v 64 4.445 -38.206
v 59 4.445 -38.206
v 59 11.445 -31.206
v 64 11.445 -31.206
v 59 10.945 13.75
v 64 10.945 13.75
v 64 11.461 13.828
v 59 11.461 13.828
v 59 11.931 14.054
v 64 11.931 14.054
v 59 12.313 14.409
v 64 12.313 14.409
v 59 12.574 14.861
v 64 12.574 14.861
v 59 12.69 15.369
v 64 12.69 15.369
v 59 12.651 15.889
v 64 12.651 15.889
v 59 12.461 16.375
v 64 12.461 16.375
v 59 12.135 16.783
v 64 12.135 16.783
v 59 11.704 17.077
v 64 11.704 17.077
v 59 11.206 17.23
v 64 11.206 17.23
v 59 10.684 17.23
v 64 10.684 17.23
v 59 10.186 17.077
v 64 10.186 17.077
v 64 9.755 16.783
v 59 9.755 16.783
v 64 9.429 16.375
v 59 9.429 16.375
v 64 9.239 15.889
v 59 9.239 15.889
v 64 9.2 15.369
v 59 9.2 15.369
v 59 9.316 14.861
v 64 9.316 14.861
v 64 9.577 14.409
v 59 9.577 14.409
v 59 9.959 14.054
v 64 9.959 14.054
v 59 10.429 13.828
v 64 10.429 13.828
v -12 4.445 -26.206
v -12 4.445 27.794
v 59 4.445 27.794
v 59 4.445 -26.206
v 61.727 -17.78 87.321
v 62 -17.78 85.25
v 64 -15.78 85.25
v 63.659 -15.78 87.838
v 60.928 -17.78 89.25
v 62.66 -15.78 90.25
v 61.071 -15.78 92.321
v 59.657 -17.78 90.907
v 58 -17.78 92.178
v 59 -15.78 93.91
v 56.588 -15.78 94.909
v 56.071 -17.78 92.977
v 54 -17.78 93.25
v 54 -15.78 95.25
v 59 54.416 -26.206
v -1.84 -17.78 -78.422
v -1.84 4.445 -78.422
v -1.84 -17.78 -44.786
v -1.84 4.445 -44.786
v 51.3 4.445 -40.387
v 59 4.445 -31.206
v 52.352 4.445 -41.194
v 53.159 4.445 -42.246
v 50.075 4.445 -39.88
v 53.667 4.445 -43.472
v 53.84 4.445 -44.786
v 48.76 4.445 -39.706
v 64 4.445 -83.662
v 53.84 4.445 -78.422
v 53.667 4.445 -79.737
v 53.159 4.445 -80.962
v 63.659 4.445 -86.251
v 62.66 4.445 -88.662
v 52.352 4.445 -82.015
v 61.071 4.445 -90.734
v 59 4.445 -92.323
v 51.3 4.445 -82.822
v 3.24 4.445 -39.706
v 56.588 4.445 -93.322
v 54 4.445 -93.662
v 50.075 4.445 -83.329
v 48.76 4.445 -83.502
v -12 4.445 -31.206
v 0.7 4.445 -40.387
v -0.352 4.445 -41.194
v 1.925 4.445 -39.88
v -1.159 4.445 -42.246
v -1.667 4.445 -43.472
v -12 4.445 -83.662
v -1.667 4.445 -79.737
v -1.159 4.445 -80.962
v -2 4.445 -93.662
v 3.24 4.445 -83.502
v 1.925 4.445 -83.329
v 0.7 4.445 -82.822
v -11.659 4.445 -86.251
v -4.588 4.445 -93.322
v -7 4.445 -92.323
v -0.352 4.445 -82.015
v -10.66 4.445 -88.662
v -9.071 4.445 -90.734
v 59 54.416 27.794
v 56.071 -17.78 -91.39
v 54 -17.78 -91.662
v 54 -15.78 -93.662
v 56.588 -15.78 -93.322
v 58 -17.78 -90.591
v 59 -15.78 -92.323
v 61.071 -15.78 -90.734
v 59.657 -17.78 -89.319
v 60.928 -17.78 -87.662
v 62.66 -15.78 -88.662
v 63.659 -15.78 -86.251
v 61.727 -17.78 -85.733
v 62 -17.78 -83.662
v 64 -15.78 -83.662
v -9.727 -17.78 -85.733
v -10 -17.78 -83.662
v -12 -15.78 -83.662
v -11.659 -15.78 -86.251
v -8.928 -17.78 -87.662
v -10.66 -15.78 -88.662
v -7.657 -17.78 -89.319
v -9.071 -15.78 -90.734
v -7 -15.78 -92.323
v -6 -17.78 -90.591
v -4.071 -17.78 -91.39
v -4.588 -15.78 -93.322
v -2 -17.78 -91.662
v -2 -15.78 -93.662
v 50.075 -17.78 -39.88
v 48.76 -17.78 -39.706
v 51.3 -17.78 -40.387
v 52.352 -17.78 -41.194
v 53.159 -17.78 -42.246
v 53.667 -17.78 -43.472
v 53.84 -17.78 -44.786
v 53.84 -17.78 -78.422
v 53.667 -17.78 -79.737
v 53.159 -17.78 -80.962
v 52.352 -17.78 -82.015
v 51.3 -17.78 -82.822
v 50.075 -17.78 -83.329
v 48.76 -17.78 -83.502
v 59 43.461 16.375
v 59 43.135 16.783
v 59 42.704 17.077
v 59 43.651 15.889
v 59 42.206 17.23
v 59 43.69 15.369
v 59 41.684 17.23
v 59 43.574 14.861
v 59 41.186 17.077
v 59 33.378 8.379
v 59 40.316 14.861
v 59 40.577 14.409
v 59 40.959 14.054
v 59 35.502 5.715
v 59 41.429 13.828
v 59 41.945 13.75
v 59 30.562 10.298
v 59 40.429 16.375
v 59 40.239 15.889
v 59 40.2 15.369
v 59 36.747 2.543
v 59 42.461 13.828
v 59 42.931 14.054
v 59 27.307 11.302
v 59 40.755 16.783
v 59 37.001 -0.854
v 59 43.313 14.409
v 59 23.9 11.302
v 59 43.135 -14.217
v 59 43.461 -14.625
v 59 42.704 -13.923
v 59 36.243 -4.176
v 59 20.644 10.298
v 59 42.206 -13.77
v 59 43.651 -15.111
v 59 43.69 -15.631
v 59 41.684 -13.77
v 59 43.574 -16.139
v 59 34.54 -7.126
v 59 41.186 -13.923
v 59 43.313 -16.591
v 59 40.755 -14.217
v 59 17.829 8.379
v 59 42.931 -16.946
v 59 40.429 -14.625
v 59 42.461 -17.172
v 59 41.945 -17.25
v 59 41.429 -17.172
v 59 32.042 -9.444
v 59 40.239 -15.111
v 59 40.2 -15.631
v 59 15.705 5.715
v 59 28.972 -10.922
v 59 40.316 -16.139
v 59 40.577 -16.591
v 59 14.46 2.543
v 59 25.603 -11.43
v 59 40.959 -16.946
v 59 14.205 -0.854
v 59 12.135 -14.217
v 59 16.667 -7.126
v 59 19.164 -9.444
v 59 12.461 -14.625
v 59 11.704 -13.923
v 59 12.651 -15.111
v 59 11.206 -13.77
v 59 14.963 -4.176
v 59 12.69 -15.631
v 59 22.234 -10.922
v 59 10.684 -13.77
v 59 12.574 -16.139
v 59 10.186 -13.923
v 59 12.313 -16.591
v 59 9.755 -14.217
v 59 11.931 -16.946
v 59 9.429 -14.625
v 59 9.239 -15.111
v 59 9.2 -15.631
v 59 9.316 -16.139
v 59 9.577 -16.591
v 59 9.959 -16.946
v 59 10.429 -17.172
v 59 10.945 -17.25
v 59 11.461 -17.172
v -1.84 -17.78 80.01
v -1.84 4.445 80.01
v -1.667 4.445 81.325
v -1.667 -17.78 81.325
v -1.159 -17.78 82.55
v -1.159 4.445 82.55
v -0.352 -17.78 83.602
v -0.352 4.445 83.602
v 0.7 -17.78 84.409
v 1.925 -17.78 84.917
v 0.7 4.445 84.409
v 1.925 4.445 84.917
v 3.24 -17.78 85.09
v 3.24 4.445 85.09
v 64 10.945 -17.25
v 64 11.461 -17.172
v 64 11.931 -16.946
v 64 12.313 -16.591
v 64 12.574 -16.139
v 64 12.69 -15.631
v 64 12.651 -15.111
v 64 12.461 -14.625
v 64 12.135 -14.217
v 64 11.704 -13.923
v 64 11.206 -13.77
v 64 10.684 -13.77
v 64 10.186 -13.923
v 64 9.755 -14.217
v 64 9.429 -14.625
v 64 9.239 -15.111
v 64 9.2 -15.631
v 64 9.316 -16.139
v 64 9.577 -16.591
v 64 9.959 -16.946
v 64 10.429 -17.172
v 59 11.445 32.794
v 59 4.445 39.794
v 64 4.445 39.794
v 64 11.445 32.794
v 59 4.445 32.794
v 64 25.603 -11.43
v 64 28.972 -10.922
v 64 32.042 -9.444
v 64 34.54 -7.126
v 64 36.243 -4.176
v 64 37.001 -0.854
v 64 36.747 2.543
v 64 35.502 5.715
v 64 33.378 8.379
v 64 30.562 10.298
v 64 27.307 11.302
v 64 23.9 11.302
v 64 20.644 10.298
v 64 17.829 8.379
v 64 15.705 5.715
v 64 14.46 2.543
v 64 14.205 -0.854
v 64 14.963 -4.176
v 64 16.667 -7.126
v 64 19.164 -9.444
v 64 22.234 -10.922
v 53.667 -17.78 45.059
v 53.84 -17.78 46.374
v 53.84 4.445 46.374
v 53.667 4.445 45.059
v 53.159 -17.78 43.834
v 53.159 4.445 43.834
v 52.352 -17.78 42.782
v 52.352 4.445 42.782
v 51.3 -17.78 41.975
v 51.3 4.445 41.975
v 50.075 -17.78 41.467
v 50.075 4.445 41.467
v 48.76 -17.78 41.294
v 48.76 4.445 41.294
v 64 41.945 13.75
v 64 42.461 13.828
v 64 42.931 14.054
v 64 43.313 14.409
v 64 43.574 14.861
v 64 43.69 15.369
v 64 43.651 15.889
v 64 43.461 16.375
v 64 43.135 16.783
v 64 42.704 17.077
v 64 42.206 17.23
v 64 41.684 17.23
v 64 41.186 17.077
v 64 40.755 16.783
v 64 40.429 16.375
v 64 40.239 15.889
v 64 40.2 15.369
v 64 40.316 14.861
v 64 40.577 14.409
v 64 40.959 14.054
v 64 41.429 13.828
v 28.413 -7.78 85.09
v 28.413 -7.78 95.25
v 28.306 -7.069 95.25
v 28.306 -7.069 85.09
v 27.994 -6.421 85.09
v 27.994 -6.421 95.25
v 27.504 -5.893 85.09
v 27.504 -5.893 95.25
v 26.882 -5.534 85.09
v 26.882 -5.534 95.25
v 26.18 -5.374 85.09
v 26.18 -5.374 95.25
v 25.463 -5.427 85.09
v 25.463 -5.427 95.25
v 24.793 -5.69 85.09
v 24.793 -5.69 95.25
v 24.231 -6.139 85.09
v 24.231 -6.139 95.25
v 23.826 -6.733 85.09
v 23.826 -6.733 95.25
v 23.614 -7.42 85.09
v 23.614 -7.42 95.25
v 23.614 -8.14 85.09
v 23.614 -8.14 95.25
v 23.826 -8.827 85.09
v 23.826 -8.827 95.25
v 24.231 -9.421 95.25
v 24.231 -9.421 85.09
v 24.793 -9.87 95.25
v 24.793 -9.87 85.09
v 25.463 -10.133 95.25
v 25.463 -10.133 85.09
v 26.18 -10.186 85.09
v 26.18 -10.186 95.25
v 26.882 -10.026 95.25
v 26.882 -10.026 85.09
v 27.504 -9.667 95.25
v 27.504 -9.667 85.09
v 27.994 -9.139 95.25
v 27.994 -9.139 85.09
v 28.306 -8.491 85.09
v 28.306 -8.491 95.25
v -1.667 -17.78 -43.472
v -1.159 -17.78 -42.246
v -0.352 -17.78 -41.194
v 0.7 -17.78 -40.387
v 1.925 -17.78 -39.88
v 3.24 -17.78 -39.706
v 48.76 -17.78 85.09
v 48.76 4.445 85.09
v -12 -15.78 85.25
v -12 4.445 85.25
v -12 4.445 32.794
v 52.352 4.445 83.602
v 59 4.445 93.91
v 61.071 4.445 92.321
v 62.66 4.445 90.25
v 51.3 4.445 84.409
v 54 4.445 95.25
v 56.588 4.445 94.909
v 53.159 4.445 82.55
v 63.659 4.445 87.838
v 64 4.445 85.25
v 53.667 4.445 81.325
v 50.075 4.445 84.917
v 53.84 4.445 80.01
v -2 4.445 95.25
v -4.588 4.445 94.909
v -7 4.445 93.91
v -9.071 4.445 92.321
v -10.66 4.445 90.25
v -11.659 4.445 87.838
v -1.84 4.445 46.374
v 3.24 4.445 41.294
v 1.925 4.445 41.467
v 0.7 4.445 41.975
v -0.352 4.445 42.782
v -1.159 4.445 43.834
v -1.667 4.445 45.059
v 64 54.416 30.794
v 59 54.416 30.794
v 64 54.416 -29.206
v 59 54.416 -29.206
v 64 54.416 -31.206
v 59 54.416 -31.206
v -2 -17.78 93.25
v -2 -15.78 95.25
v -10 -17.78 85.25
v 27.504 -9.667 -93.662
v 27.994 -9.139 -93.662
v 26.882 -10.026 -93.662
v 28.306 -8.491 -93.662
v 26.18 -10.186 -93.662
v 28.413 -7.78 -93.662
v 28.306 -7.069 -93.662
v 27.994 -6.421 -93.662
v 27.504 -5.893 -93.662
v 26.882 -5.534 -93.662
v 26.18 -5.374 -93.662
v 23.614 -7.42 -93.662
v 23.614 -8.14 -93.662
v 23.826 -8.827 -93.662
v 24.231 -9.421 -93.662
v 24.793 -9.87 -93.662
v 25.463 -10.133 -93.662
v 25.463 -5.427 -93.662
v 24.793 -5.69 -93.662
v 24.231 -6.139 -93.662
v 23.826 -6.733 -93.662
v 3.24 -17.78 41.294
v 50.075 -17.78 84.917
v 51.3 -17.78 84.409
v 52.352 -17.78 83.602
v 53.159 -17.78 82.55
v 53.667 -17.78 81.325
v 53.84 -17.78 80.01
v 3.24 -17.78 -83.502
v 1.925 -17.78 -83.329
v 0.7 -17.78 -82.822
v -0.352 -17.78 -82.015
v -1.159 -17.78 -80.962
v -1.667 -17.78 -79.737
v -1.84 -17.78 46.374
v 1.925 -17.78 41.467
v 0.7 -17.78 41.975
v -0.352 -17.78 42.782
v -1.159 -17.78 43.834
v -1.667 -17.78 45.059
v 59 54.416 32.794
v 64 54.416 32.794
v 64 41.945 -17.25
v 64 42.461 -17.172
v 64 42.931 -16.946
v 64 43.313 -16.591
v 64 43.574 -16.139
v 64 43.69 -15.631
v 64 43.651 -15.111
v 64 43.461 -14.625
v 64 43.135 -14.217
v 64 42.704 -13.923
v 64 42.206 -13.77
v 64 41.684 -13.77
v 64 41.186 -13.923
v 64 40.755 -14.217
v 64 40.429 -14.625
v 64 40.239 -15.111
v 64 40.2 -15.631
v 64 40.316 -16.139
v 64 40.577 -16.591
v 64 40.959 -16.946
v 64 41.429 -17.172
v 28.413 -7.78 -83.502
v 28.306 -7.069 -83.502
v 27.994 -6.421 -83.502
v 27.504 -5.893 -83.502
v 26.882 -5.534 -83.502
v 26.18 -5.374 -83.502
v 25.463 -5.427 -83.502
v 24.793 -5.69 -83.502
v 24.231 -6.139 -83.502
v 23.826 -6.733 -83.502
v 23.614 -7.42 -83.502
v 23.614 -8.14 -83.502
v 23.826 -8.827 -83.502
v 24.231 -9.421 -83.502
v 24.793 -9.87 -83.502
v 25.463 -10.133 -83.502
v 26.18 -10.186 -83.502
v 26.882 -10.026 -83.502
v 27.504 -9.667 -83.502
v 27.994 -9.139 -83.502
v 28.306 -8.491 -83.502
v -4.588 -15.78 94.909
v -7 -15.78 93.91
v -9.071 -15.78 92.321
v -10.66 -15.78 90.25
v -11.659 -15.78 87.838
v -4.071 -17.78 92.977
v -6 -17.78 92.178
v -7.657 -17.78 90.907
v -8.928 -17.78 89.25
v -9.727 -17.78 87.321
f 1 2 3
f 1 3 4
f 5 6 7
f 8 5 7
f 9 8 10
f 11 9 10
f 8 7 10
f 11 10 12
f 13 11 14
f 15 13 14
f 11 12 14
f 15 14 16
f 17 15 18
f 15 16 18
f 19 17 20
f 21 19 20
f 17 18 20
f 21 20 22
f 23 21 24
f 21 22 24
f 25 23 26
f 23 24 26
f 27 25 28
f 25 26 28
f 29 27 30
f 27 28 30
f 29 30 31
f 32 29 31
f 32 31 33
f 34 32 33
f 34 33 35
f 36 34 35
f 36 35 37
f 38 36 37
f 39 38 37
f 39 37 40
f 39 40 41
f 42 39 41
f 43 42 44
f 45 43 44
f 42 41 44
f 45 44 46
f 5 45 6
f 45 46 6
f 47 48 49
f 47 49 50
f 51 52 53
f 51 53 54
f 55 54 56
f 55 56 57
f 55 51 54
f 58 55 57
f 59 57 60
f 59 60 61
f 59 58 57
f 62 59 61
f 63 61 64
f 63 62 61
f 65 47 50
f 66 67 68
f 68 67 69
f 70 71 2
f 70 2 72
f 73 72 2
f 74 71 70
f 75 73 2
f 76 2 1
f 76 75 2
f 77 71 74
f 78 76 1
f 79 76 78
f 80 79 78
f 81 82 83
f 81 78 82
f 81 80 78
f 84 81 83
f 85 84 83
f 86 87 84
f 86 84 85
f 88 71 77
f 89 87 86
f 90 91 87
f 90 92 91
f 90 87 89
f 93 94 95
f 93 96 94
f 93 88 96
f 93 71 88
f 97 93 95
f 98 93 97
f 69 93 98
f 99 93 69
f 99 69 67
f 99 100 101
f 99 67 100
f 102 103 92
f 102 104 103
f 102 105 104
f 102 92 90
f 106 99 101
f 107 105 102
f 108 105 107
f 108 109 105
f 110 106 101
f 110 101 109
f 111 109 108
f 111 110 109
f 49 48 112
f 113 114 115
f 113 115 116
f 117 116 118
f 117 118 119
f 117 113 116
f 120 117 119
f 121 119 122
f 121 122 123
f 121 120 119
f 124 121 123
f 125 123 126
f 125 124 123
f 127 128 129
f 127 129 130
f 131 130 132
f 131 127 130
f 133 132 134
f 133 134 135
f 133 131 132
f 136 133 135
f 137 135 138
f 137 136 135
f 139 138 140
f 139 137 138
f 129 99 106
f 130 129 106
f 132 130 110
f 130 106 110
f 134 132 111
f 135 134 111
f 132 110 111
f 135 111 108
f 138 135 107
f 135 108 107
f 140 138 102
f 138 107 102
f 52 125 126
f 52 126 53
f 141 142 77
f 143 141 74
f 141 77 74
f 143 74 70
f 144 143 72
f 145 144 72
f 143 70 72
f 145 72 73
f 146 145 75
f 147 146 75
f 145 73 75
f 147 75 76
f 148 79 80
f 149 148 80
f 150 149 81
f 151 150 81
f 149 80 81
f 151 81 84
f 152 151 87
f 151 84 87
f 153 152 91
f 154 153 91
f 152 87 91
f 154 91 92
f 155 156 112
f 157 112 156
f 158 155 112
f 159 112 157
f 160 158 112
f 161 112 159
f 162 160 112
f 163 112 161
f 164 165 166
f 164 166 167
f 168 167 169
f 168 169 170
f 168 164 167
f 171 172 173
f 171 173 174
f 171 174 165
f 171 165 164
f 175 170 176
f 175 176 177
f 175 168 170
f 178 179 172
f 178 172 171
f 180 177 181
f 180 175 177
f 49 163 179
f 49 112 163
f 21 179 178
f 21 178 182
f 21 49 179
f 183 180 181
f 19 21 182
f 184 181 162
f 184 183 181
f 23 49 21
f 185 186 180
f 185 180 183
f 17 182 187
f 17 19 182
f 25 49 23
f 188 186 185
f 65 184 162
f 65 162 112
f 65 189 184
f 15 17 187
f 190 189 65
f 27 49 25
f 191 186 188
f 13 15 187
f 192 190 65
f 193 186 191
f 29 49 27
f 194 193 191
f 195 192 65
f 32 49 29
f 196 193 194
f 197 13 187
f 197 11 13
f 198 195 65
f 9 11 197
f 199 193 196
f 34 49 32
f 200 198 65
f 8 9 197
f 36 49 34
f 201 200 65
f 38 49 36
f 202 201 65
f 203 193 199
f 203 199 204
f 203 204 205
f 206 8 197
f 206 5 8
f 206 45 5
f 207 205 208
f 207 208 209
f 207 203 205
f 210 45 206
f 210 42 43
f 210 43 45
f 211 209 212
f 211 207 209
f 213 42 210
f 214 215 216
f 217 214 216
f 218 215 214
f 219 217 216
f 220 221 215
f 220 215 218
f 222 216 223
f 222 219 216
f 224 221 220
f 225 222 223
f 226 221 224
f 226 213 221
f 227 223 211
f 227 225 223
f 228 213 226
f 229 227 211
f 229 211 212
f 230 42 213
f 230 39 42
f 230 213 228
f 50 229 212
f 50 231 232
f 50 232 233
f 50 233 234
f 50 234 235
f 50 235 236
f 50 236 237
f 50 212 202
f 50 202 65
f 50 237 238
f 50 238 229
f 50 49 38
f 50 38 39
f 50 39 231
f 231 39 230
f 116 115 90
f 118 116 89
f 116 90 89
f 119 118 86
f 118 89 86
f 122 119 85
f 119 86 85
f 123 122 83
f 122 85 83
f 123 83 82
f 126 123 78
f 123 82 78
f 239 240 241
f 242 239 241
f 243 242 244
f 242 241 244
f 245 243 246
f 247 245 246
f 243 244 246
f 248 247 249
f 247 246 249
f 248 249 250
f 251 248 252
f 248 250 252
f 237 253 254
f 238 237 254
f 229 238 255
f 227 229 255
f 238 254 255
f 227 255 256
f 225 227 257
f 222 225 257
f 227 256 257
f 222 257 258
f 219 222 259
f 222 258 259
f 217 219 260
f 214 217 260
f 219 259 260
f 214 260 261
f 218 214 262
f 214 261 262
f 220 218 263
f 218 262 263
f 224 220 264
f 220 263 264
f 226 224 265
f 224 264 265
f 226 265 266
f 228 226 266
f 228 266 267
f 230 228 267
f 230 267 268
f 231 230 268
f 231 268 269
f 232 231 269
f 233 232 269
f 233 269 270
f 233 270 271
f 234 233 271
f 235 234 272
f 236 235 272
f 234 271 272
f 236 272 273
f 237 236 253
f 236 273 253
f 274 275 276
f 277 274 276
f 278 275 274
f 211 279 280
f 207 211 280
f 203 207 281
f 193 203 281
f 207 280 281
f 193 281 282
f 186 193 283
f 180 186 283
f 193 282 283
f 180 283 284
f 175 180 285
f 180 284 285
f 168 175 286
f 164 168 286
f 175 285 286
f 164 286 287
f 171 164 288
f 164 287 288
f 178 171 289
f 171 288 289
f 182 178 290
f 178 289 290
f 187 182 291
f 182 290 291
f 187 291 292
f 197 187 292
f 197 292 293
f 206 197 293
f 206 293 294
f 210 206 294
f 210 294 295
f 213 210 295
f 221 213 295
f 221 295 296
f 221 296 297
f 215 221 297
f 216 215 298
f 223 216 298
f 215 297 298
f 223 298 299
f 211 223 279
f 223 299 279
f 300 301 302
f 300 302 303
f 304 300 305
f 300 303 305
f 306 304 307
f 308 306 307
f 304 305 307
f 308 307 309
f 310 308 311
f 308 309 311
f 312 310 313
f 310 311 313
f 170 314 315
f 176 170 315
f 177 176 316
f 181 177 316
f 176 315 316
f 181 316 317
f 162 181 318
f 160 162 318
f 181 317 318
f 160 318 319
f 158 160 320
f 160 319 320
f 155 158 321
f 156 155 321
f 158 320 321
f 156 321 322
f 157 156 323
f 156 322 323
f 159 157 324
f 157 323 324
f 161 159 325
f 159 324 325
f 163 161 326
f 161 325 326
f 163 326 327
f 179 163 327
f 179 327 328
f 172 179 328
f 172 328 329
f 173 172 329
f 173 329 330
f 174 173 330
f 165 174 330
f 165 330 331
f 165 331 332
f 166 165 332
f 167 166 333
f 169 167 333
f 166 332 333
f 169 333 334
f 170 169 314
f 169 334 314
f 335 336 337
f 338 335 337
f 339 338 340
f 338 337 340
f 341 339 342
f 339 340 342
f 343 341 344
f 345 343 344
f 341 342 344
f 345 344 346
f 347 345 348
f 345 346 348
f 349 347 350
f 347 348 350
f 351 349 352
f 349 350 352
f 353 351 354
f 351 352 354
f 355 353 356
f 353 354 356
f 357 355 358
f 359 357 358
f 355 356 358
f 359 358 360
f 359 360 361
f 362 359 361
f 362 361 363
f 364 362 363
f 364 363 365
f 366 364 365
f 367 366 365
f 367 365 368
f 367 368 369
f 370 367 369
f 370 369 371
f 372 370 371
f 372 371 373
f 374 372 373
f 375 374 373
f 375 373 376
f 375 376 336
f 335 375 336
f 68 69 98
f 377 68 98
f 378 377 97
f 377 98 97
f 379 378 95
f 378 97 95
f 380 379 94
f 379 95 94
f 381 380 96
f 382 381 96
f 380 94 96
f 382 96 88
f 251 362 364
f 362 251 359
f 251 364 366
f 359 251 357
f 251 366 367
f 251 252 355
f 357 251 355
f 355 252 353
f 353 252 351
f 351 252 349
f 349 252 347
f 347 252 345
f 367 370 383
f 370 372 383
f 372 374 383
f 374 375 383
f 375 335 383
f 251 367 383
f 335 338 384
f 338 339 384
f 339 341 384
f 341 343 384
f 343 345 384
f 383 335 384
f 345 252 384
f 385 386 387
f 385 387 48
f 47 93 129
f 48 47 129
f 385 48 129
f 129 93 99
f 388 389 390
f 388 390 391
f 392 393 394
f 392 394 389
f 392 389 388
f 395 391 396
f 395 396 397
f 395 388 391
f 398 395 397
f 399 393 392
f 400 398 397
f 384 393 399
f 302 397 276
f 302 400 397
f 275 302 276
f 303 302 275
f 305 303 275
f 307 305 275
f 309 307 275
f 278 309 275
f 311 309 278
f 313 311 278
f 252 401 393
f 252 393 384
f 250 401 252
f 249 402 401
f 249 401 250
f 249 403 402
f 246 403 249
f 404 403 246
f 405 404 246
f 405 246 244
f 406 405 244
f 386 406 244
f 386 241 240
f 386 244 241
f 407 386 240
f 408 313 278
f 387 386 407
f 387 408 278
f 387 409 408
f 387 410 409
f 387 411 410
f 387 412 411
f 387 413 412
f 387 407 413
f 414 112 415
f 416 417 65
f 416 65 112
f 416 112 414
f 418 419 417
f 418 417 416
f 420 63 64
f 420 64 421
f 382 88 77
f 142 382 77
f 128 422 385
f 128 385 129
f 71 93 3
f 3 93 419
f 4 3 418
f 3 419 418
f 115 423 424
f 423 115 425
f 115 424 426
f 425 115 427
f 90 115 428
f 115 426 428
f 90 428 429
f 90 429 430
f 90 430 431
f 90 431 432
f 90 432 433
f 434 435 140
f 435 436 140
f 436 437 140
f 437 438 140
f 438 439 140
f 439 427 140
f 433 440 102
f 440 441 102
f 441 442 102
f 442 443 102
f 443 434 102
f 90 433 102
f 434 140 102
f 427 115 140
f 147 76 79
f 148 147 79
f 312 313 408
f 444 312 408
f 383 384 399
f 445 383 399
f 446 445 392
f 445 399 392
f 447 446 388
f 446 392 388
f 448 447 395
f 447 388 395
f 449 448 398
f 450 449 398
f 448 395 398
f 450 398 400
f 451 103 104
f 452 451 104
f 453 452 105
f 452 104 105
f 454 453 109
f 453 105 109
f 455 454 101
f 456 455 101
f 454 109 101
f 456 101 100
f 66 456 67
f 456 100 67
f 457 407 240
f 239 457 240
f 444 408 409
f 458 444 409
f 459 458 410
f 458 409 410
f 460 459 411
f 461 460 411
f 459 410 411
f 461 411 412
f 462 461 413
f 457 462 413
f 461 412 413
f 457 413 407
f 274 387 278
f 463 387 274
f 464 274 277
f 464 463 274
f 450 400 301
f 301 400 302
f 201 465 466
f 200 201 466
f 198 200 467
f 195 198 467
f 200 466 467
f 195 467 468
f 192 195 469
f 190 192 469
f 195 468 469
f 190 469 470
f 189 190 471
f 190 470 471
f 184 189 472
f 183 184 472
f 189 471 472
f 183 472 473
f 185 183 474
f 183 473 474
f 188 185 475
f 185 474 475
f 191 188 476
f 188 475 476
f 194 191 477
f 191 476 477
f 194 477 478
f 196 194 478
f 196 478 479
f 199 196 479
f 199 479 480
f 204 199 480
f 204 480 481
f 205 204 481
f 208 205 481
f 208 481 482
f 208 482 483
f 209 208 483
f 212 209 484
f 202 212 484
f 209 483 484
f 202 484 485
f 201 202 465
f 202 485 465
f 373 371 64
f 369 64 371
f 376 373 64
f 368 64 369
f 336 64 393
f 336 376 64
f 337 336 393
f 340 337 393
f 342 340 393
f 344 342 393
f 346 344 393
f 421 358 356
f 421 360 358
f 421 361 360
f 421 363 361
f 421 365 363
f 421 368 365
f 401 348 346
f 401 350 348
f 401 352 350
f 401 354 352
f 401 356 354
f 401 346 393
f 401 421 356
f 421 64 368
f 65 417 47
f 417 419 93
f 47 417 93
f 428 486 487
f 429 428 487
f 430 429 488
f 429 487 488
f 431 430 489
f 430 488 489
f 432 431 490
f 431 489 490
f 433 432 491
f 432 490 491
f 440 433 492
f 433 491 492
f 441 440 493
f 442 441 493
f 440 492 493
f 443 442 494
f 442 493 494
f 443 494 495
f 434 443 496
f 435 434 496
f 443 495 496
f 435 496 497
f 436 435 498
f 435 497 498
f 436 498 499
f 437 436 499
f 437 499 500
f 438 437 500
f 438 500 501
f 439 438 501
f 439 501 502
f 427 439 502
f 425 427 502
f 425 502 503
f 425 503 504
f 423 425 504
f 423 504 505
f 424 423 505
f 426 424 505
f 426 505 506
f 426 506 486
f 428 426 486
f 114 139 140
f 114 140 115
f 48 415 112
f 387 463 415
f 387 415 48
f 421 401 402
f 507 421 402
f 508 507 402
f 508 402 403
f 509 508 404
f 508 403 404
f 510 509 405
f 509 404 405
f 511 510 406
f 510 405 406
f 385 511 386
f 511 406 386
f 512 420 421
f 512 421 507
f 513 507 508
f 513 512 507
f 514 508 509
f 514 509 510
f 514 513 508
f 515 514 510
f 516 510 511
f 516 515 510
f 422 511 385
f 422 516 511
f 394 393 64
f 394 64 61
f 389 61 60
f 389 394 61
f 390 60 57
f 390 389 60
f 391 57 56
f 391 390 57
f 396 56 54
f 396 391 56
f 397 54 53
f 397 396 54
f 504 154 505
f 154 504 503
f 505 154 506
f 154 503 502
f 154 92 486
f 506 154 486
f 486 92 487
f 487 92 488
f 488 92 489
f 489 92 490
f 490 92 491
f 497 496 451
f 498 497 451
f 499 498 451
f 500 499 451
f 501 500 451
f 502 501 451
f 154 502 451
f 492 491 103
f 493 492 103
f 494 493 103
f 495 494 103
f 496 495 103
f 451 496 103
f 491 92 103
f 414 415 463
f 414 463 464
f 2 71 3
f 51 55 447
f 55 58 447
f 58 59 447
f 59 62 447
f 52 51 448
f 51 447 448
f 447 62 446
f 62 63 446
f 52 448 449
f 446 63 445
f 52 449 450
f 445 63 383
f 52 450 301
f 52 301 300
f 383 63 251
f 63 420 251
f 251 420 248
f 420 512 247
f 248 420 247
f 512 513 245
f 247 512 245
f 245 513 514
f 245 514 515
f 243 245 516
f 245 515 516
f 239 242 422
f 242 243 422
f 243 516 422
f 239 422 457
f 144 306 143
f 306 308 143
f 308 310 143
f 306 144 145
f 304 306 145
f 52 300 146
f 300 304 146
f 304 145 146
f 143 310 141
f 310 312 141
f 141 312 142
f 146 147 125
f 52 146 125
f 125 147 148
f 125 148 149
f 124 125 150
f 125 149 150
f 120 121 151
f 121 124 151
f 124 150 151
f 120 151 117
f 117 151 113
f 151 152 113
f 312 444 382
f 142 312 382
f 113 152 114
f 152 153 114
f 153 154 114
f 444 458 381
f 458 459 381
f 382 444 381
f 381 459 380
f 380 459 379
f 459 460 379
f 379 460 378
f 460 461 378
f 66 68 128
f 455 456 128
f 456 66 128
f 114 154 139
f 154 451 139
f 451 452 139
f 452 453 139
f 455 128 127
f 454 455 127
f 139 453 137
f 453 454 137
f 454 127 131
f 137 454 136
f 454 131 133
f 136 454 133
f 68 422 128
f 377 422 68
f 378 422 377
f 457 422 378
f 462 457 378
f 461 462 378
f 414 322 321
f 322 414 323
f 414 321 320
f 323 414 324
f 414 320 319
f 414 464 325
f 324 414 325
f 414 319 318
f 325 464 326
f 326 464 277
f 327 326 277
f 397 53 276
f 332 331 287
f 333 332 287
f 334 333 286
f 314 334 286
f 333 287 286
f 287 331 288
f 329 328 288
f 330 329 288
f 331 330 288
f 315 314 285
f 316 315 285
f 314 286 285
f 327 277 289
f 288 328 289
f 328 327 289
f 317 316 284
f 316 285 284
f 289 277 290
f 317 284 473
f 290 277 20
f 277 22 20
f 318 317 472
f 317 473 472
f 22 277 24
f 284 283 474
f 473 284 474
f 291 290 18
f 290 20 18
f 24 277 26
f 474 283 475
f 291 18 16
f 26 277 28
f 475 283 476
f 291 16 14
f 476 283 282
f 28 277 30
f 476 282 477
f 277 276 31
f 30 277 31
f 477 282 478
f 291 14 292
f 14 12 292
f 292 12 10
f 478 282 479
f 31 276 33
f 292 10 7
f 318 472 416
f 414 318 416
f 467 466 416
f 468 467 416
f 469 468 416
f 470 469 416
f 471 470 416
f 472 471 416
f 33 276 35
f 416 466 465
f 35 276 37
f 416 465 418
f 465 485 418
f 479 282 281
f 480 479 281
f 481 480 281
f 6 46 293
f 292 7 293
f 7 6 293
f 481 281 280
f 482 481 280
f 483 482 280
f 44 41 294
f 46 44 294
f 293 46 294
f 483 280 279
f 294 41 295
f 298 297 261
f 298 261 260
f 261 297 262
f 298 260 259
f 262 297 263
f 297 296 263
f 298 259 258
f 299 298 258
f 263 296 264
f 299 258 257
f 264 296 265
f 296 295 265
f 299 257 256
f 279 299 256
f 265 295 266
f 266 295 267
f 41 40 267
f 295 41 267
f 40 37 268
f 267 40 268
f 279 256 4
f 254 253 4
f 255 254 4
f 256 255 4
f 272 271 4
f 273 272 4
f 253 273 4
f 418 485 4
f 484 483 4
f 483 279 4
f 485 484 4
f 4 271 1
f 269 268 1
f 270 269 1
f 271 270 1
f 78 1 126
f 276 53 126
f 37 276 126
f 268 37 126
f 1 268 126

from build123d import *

# Parameters (mm, degrees)
BOSS_EXTRUDE1_DEPTH      = 64
BOSS_EXTRUDE1_DEPTH_BACK = 12
SKETCH1_W                = 188.9125
SKETCH1_H                = 22.225
SKETCH3_W                = 60
SKETCH3_H                = 50
BOSS_EXTRUDE2_DEPTH      = 5
SKETCH4_R                = 11.43
SKETCH4_R_2              = 1.7499965
SKETCH4_R_3              = 1.75
CUT_EXTRUDE1_DEPTH       = 5
FILLET2_R                = 10
FILLET3_R                = 10
FILLET6_R                = 10
FILLET8_R                = 10
SKETCH18_W               = 5
SKETCH18_H               = 2
BOSS_EXTRUDE4_DEPTH      = 49.97124
SKETCH19_W               = 5
SKETCH19_H               = 2
BOSS_EXTRUDE5_DEPTH      = 49.971244
SKETCH26_R               = 2.413
CUT_EXTRUDE3_DEPTH       = 31.496
CHAMFER1_SIZE            = 7
CHAMFER2_SIZE            = 2
BOSS_EXTRUDE6_DEPTH      = 5
BOSS_EXTRUDE7_DEPTH      = 5
CUT_EXTRUDE2_DEPTH       = 126.162645094
CUT_EXTRUDE4_START       = 16.51
SKETCH27_R               = 2.413
CUT_EXTRUDE4_DEPTH       = 16.51


with BuildPart() as part:
    # Sketch1 → Boss-Extrude1 (new, two sides: drawn at the far end of the back side and taken through both)
    with BuildSketch(Plane(origin=(0, 0, 0), x_dir=(0, 0, -1), z_dir=(1, 0, 0)).offset(-BOSS_EXTRUDE1_DEPTH_BACK)):
        with Locations((-0.79375, -6.6675)):
            Rectangle(SKETCH1_W, SKETCH1_H)
    extrude(amount=BOSS_EXTRUDE1_DEPTH + BOSS_EXTRUDE1_DEPTH_BACK)

    # Sketch3 → Boss-Extrude2 (add)
    with BuildSketch(Plane(origin=(64, 8.866131276, 9.663552159), x_dir=(0, 0, -1), z_dir=(1, 0, 0))):
        with Locations((8.869802159, 20.550112642)):
            Rectangle(SKETCH3_W, SKETCH3_H)
    extrude(amount=-BOSS_EXTRUDE2_DEPTH)

    # Sketch4 → Cut-Extrude1 (cut)
    with BuildSketch(Plane(origin=(64, 0, 0), x_dir=(0, 0, -1), z_dir=(1, 0, 0))):
        with Locations((0, 25.6032)):
            Circle(SKETCH4_R)
        with Locations((-15.5, 41.945)):
            Circle(SKETCH4_R_2)
        with Locations((15.5, 41.945)):
            Circle(SKETCH4_R_2)
        with Locations((-15.5, 10.945)):
            Circle(SKETCH4_R_3)
        with Locations((15.5, 10.945)):
            Circle(SKETCH4_R_3)
    extrude(amount=-CUT_EXTRUDE1_DEPTH, mode=Mode.SUBTRACT)

    # Fillet2
    fillet2_edges = [part.edges().sort_by_distance(p)[0] for p in [
        (-12, -6.6675, 95.25),
    ]]
    fillet(fillet2_edges, radius=FILLET2_R)

    # Fillet3
    fillet3_edges = [part.edges().sort_by_distance(p)[0] for p in [
        (64, -6.6675, 95.25),
    ]]
    fillet(fillet3_edges, radius=FILLET3_R)

    # Fillet6
    fillet6_edges = [part.edges().sort_by_distance(p)[0] for p in [
        (-12, -6.6675, -93.6625),
    ]]
    fillet(fillet6_edges, radius=FILLET6_R)

    # Fillet8
    fillet8_edges = [part.edges().sort_by_distance(p)[0] for p in [
        (64, -6.6675, -93.6625),
    ]]
    fillet(fillet8_edges, radius=FILLET8_R)

    # Sketch18 → Boss-Extrude4 (add)
    with BuildSketch(Plane(origin=(0, 4.445, 0), x_dir=(1, 0, 0), z_dir=(0, 1, 0))):
        with Locations((61.5, -31.79375)):
            Rectangle(SKETCH18_W, SKETCH18_H)
    extrude(amount=BOSS_EXTRUDE4_DEPTH)

    # Sketch19 → Boss-Extrude5 (add)
    with BuildSketch(Plane(origin=(0, 4.445, 0), x_dir=(1, 0, 0), z_dir=(0, 1, 0))):
        with Locations((61.5, 30.20625)):
            Rectangle(SKETCH19_W, SKETCH19_H)
    extrude(amount=BOSS_EXTRUDE5_DEPTH)

    # Sketch26 → Cut-Extrude3 (cut)
    with BuildSketch(Plane.XY.offset(95.25)):
        with Locations((26, -7.78)):
            Circle(SKETCH26_R)
    extrude(amount=-CUT_EXTRUDE3_DEPTH, mode=Mode.SUBTRACT)

    # Chamfer1
    chamfer1_edges = [part.edges().sort_by_distance(p)[0] for p in [
        (61.5, 4.445, -31.20625),
        (61.5, 4.445, 32.79375),
    ]]
    chamfer(chamfer1_edges, length=CHAMFER1_SIZE)

    # Chamfer2
    chamfer2_edges = [part.edges().sort_by_distance(p)[0] for p in [
        (-12, -17.78, 0.79375),
        (26, -17.78, 95.25),
        (-9.071067812, -17.78, 92.321067812),
        (64, -17.78, 0.79375),
        (61.071067812, -17.78, 92.321067812),
        (26, -17.78, -93.6625),
        (-9.071067812, -17.78, -90.733567812),
        (61.071067812, -17.78, -90.733567812),
    ]]
    chamfer(chamfer2_edges, length=CHAMFER2_SIZE)

    # Sketch20 → Boss-Extrude6 (add)
    with BuildSketch(Plane(origin=(0, 0, -31.20625), x_dir=(-1, 0, 0), z_dir=(0, 0, -1))):
        Polygon((-59, 54.416243918), (12, 4.445), (-59, 4.445), align=None)
    extrude(amount=-BOSS_EXTRUDE6_DEPTH)

    # Sketch21 → Boss-Extrude7 (add)
    with BuildSketch(Plane.XY.offset(32.79375)):
        Polygon((59, 54.416243918), (-12, 4.445), (59, 4.445), align=None)
    extrude(amount=-BOSS_EXTRUDE7_DEPTH)

    # Sketch23 → Cut-Extrude2 (cut, through all)
    with BuildSketch(Plane(origin=(0, 4.445, 0), x_dir=(1, 0, 0), z_dir=(0, 1, 0))):
        with BuildLine():
            Line((48.76, -41.29394195), (3.24, -41.29394195))
            ThreePointArc((3.24, -41.29394195), (-0.352102448, -42.781839501), (-1.84, -46.37394195))
            Line((-1.84, -46.37394195), (-1.84, -80.01))
            ThreePointArc((-1.84, -80.01), (-0.352102448, -83.602102448), (3.24, -85.09))
            Line((3.24, -85.09), (48.76, -85.09))
            ThreePointArc((48.76, -85.09), (52.352102448, -83.602102448), (53.84, -80.01))
            Line((53.84, -80.01), (53.84, -46.37394195))
            ThreePointArc((53.84, -46.37394195), (52.352102448, -42.781839501), (48.76, -41.29394195))
        make_face()
        with BuildLine():
            Line((48.76, 83.5025), (3.24, 83.5025))
            ThreePointArc((3.24, 83.5025), (-0.352102448, 82.014602448), (-1.84, 78.4225))
            Line((-1.84, 78.4225), (-1.84, 44.78644195))
            ThreePointArc((-1.84, 44.78644195), (-0.352102448, 41.194339501), (3.24, 39.70644195))
            Line((3.24, 39.70644195), (48.76, 39.70644195))
            ThreePointArc((48.76, 39.70644195), (52.352102448, 41.194339501), (53.84, 44.78644195))
            Line((53.84, 44.78644195), (53.84, 78.4225))
            ThreePointArc((53.84, 78.4225), (52.352102448, 82.014602448), (48.76, 83.5025))
        make_face()
    extrude(amount=-CUT_EXTRUDE2_DEPTH, mode=Mode.SUBTRACT)

    # Sketch27 → Cut-Extrude4 (cut)
    with BuildSketch(Plane.XY.offset(-93.6625).offset(CUT_EXTRUDE4_START)):
        with Locations((26, -7.78)):
            Circle(SKETCH27_R)
    extrude(amount=-CUT_EXTRUDE4_DEPTH, mode=Mode.SUBTRACT)


solid = part.part
